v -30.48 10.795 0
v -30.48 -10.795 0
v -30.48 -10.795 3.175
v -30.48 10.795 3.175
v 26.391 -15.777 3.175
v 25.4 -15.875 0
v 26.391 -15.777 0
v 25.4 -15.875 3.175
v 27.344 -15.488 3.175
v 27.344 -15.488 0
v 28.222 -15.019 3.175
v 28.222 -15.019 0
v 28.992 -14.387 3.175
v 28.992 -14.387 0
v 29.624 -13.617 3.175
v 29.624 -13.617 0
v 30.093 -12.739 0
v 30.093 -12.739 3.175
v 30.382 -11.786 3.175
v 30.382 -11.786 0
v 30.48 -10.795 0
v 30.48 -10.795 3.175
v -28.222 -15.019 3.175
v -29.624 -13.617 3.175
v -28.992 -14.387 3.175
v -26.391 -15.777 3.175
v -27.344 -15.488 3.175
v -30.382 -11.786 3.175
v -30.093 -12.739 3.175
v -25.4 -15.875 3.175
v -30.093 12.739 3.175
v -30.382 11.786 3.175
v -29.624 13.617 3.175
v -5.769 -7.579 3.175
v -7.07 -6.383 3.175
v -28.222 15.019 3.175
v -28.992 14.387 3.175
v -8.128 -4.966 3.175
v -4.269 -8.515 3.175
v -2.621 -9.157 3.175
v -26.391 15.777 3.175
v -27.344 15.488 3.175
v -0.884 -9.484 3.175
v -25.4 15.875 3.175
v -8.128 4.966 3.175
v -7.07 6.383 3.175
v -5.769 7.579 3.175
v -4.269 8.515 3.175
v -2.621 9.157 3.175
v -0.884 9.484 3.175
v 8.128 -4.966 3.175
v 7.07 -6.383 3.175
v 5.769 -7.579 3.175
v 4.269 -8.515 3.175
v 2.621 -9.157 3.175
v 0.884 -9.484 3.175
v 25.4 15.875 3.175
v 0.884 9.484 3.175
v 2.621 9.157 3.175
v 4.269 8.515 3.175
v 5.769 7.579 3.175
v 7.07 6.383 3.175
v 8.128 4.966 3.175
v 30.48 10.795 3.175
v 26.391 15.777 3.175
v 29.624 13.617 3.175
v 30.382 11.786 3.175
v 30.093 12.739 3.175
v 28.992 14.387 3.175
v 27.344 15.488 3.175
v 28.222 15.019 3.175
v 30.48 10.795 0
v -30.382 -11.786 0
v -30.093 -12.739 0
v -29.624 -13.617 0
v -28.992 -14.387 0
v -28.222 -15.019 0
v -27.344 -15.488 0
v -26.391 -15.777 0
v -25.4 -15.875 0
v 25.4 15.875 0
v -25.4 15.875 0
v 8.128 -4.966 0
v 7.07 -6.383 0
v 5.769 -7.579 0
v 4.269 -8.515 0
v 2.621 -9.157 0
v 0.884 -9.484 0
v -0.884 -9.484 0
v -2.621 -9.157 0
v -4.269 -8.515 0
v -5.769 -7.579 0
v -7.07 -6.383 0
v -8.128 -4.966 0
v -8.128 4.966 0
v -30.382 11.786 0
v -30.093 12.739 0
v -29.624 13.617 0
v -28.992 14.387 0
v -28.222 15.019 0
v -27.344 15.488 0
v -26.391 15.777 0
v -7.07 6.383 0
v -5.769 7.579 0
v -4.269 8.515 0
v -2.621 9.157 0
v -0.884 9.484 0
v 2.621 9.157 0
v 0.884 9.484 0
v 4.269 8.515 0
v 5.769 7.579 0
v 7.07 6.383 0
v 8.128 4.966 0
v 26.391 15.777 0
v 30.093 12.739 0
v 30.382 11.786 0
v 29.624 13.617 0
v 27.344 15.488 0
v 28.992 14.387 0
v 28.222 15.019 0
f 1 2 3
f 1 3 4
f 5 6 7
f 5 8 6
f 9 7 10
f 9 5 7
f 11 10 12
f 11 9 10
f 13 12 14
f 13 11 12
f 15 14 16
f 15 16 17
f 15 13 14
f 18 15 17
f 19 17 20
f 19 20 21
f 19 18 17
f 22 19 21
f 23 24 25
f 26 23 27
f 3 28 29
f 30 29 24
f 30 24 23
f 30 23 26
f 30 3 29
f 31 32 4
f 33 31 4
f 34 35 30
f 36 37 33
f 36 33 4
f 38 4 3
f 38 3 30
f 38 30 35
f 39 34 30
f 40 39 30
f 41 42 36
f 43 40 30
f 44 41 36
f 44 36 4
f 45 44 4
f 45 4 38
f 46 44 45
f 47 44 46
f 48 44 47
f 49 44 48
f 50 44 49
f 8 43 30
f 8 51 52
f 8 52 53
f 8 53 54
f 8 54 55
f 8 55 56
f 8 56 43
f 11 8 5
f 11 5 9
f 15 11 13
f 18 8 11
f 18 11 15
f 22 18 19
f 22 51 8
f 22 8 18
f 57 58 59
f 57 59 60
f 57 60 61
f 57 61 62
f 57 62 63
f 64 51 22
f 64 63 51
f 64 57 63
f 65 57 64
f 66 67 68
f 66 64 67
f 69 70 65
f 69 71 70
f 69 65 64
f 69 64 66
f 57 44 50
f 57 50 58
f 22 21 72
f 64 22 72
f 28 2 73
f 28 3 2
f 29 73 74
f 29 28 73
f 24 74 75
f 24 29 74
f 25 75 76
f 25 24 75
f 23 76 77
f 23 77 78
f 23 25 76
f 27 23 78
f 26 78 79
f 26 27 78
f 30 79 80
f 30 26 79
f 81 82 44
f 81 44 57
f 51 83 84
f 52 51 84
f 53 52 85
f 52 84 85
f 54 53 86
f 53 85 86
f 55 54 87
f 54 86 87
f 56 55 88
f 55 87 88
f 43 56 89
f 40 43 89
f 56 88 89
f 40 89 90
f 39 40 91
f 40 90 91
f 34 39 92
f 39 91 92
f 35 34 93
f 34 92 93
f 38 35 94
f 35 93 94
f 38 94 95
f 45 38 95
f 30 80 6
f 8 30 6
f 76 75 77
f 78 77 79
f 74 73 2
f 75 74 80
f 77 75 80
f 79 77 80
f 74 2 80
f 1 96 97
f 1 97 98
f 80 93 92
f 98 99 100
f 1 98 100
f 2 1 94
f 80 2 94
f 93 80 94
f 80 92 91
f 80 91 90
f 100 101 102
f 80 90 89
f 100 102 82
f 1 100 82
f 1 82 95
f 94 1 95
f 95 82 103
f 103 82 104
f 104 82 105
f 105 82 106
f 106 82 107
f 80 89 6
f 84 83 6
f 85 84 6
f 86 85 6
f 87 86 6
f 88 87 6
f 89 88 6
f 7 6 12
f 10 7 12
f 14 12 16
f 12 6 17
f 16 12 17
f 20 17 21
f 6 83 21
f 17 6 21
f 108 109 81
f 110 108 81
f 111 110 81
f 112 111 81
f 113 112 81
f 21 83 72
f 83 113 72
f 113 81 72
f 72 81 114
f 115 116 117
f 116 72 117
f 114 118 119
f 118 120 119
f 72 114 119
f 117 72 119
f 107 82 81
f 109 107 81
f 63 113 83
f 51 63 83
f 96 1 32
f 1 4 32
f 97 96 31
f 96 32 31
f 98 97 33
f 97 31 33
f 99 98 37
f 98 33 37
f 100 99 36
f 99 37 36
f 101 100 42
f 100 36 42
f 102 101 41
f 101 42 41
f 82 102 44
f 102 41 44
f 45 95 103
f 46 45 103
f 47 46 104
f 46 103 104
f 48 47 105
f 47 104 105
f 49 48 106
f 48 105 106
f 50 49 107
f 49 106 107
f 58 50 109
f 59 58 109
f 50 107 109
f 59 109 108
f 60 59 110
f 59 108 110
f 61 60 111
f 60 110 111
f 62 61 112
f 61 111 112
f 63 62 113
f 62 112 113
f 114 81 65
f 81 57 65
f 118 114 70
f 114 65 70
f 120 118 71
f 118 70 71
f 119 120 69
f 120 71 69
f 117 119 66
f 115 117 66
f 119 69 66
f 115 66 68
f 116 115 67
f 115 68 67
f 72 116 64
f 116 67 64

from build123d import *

# Parameters (mm, degrees)
F0_W     = 60.96
F0_H     = 31.75
F1_DEPTH = 3.175
F2_R     = 5.08


# Not quite as in the source:
# - a length typed as a fraction of an inch, garbled in the dataset ("3 / 203.2 mm" for 3/8 in), is restored


with BuildPart() as f1:
    # F0 (on Top) → F1 (new body)
    with BuildSketch(Plane.XY):
        Rectangle(F0_W, F0_H)
        with BuildLine():
            Line((-8.128, -4.9660085582), (-8.128, 4.9660085582))
            ThreePointArc((-8.128, 4.9660085582), (0, 9.525), (8.128, 4.9660085582))
            Line((8.128, 4.9660085582), (8.128, -4.9660085582))
            ThreePointArc((8.128, -4.9660085582), (0, -9.525), (-8.128, -4.9660085582))
        make_face(mode=Mode.SUBTRACT)
    extrude(amount=F1_DEPTH)

    # F2
    f2_edges = [f1.edges().sort_by_distance(p)[0] for p in [
        (-30.48, 15.875, 1.5875),
        (30.48, 15.875, 1.5875),
        (-30.48, -15.875, 1.5875),
        (30.48, -15.875, 1.5875),
    ]]
    fillet(f2_edges, radius=F2_R)


solid = f1.part
